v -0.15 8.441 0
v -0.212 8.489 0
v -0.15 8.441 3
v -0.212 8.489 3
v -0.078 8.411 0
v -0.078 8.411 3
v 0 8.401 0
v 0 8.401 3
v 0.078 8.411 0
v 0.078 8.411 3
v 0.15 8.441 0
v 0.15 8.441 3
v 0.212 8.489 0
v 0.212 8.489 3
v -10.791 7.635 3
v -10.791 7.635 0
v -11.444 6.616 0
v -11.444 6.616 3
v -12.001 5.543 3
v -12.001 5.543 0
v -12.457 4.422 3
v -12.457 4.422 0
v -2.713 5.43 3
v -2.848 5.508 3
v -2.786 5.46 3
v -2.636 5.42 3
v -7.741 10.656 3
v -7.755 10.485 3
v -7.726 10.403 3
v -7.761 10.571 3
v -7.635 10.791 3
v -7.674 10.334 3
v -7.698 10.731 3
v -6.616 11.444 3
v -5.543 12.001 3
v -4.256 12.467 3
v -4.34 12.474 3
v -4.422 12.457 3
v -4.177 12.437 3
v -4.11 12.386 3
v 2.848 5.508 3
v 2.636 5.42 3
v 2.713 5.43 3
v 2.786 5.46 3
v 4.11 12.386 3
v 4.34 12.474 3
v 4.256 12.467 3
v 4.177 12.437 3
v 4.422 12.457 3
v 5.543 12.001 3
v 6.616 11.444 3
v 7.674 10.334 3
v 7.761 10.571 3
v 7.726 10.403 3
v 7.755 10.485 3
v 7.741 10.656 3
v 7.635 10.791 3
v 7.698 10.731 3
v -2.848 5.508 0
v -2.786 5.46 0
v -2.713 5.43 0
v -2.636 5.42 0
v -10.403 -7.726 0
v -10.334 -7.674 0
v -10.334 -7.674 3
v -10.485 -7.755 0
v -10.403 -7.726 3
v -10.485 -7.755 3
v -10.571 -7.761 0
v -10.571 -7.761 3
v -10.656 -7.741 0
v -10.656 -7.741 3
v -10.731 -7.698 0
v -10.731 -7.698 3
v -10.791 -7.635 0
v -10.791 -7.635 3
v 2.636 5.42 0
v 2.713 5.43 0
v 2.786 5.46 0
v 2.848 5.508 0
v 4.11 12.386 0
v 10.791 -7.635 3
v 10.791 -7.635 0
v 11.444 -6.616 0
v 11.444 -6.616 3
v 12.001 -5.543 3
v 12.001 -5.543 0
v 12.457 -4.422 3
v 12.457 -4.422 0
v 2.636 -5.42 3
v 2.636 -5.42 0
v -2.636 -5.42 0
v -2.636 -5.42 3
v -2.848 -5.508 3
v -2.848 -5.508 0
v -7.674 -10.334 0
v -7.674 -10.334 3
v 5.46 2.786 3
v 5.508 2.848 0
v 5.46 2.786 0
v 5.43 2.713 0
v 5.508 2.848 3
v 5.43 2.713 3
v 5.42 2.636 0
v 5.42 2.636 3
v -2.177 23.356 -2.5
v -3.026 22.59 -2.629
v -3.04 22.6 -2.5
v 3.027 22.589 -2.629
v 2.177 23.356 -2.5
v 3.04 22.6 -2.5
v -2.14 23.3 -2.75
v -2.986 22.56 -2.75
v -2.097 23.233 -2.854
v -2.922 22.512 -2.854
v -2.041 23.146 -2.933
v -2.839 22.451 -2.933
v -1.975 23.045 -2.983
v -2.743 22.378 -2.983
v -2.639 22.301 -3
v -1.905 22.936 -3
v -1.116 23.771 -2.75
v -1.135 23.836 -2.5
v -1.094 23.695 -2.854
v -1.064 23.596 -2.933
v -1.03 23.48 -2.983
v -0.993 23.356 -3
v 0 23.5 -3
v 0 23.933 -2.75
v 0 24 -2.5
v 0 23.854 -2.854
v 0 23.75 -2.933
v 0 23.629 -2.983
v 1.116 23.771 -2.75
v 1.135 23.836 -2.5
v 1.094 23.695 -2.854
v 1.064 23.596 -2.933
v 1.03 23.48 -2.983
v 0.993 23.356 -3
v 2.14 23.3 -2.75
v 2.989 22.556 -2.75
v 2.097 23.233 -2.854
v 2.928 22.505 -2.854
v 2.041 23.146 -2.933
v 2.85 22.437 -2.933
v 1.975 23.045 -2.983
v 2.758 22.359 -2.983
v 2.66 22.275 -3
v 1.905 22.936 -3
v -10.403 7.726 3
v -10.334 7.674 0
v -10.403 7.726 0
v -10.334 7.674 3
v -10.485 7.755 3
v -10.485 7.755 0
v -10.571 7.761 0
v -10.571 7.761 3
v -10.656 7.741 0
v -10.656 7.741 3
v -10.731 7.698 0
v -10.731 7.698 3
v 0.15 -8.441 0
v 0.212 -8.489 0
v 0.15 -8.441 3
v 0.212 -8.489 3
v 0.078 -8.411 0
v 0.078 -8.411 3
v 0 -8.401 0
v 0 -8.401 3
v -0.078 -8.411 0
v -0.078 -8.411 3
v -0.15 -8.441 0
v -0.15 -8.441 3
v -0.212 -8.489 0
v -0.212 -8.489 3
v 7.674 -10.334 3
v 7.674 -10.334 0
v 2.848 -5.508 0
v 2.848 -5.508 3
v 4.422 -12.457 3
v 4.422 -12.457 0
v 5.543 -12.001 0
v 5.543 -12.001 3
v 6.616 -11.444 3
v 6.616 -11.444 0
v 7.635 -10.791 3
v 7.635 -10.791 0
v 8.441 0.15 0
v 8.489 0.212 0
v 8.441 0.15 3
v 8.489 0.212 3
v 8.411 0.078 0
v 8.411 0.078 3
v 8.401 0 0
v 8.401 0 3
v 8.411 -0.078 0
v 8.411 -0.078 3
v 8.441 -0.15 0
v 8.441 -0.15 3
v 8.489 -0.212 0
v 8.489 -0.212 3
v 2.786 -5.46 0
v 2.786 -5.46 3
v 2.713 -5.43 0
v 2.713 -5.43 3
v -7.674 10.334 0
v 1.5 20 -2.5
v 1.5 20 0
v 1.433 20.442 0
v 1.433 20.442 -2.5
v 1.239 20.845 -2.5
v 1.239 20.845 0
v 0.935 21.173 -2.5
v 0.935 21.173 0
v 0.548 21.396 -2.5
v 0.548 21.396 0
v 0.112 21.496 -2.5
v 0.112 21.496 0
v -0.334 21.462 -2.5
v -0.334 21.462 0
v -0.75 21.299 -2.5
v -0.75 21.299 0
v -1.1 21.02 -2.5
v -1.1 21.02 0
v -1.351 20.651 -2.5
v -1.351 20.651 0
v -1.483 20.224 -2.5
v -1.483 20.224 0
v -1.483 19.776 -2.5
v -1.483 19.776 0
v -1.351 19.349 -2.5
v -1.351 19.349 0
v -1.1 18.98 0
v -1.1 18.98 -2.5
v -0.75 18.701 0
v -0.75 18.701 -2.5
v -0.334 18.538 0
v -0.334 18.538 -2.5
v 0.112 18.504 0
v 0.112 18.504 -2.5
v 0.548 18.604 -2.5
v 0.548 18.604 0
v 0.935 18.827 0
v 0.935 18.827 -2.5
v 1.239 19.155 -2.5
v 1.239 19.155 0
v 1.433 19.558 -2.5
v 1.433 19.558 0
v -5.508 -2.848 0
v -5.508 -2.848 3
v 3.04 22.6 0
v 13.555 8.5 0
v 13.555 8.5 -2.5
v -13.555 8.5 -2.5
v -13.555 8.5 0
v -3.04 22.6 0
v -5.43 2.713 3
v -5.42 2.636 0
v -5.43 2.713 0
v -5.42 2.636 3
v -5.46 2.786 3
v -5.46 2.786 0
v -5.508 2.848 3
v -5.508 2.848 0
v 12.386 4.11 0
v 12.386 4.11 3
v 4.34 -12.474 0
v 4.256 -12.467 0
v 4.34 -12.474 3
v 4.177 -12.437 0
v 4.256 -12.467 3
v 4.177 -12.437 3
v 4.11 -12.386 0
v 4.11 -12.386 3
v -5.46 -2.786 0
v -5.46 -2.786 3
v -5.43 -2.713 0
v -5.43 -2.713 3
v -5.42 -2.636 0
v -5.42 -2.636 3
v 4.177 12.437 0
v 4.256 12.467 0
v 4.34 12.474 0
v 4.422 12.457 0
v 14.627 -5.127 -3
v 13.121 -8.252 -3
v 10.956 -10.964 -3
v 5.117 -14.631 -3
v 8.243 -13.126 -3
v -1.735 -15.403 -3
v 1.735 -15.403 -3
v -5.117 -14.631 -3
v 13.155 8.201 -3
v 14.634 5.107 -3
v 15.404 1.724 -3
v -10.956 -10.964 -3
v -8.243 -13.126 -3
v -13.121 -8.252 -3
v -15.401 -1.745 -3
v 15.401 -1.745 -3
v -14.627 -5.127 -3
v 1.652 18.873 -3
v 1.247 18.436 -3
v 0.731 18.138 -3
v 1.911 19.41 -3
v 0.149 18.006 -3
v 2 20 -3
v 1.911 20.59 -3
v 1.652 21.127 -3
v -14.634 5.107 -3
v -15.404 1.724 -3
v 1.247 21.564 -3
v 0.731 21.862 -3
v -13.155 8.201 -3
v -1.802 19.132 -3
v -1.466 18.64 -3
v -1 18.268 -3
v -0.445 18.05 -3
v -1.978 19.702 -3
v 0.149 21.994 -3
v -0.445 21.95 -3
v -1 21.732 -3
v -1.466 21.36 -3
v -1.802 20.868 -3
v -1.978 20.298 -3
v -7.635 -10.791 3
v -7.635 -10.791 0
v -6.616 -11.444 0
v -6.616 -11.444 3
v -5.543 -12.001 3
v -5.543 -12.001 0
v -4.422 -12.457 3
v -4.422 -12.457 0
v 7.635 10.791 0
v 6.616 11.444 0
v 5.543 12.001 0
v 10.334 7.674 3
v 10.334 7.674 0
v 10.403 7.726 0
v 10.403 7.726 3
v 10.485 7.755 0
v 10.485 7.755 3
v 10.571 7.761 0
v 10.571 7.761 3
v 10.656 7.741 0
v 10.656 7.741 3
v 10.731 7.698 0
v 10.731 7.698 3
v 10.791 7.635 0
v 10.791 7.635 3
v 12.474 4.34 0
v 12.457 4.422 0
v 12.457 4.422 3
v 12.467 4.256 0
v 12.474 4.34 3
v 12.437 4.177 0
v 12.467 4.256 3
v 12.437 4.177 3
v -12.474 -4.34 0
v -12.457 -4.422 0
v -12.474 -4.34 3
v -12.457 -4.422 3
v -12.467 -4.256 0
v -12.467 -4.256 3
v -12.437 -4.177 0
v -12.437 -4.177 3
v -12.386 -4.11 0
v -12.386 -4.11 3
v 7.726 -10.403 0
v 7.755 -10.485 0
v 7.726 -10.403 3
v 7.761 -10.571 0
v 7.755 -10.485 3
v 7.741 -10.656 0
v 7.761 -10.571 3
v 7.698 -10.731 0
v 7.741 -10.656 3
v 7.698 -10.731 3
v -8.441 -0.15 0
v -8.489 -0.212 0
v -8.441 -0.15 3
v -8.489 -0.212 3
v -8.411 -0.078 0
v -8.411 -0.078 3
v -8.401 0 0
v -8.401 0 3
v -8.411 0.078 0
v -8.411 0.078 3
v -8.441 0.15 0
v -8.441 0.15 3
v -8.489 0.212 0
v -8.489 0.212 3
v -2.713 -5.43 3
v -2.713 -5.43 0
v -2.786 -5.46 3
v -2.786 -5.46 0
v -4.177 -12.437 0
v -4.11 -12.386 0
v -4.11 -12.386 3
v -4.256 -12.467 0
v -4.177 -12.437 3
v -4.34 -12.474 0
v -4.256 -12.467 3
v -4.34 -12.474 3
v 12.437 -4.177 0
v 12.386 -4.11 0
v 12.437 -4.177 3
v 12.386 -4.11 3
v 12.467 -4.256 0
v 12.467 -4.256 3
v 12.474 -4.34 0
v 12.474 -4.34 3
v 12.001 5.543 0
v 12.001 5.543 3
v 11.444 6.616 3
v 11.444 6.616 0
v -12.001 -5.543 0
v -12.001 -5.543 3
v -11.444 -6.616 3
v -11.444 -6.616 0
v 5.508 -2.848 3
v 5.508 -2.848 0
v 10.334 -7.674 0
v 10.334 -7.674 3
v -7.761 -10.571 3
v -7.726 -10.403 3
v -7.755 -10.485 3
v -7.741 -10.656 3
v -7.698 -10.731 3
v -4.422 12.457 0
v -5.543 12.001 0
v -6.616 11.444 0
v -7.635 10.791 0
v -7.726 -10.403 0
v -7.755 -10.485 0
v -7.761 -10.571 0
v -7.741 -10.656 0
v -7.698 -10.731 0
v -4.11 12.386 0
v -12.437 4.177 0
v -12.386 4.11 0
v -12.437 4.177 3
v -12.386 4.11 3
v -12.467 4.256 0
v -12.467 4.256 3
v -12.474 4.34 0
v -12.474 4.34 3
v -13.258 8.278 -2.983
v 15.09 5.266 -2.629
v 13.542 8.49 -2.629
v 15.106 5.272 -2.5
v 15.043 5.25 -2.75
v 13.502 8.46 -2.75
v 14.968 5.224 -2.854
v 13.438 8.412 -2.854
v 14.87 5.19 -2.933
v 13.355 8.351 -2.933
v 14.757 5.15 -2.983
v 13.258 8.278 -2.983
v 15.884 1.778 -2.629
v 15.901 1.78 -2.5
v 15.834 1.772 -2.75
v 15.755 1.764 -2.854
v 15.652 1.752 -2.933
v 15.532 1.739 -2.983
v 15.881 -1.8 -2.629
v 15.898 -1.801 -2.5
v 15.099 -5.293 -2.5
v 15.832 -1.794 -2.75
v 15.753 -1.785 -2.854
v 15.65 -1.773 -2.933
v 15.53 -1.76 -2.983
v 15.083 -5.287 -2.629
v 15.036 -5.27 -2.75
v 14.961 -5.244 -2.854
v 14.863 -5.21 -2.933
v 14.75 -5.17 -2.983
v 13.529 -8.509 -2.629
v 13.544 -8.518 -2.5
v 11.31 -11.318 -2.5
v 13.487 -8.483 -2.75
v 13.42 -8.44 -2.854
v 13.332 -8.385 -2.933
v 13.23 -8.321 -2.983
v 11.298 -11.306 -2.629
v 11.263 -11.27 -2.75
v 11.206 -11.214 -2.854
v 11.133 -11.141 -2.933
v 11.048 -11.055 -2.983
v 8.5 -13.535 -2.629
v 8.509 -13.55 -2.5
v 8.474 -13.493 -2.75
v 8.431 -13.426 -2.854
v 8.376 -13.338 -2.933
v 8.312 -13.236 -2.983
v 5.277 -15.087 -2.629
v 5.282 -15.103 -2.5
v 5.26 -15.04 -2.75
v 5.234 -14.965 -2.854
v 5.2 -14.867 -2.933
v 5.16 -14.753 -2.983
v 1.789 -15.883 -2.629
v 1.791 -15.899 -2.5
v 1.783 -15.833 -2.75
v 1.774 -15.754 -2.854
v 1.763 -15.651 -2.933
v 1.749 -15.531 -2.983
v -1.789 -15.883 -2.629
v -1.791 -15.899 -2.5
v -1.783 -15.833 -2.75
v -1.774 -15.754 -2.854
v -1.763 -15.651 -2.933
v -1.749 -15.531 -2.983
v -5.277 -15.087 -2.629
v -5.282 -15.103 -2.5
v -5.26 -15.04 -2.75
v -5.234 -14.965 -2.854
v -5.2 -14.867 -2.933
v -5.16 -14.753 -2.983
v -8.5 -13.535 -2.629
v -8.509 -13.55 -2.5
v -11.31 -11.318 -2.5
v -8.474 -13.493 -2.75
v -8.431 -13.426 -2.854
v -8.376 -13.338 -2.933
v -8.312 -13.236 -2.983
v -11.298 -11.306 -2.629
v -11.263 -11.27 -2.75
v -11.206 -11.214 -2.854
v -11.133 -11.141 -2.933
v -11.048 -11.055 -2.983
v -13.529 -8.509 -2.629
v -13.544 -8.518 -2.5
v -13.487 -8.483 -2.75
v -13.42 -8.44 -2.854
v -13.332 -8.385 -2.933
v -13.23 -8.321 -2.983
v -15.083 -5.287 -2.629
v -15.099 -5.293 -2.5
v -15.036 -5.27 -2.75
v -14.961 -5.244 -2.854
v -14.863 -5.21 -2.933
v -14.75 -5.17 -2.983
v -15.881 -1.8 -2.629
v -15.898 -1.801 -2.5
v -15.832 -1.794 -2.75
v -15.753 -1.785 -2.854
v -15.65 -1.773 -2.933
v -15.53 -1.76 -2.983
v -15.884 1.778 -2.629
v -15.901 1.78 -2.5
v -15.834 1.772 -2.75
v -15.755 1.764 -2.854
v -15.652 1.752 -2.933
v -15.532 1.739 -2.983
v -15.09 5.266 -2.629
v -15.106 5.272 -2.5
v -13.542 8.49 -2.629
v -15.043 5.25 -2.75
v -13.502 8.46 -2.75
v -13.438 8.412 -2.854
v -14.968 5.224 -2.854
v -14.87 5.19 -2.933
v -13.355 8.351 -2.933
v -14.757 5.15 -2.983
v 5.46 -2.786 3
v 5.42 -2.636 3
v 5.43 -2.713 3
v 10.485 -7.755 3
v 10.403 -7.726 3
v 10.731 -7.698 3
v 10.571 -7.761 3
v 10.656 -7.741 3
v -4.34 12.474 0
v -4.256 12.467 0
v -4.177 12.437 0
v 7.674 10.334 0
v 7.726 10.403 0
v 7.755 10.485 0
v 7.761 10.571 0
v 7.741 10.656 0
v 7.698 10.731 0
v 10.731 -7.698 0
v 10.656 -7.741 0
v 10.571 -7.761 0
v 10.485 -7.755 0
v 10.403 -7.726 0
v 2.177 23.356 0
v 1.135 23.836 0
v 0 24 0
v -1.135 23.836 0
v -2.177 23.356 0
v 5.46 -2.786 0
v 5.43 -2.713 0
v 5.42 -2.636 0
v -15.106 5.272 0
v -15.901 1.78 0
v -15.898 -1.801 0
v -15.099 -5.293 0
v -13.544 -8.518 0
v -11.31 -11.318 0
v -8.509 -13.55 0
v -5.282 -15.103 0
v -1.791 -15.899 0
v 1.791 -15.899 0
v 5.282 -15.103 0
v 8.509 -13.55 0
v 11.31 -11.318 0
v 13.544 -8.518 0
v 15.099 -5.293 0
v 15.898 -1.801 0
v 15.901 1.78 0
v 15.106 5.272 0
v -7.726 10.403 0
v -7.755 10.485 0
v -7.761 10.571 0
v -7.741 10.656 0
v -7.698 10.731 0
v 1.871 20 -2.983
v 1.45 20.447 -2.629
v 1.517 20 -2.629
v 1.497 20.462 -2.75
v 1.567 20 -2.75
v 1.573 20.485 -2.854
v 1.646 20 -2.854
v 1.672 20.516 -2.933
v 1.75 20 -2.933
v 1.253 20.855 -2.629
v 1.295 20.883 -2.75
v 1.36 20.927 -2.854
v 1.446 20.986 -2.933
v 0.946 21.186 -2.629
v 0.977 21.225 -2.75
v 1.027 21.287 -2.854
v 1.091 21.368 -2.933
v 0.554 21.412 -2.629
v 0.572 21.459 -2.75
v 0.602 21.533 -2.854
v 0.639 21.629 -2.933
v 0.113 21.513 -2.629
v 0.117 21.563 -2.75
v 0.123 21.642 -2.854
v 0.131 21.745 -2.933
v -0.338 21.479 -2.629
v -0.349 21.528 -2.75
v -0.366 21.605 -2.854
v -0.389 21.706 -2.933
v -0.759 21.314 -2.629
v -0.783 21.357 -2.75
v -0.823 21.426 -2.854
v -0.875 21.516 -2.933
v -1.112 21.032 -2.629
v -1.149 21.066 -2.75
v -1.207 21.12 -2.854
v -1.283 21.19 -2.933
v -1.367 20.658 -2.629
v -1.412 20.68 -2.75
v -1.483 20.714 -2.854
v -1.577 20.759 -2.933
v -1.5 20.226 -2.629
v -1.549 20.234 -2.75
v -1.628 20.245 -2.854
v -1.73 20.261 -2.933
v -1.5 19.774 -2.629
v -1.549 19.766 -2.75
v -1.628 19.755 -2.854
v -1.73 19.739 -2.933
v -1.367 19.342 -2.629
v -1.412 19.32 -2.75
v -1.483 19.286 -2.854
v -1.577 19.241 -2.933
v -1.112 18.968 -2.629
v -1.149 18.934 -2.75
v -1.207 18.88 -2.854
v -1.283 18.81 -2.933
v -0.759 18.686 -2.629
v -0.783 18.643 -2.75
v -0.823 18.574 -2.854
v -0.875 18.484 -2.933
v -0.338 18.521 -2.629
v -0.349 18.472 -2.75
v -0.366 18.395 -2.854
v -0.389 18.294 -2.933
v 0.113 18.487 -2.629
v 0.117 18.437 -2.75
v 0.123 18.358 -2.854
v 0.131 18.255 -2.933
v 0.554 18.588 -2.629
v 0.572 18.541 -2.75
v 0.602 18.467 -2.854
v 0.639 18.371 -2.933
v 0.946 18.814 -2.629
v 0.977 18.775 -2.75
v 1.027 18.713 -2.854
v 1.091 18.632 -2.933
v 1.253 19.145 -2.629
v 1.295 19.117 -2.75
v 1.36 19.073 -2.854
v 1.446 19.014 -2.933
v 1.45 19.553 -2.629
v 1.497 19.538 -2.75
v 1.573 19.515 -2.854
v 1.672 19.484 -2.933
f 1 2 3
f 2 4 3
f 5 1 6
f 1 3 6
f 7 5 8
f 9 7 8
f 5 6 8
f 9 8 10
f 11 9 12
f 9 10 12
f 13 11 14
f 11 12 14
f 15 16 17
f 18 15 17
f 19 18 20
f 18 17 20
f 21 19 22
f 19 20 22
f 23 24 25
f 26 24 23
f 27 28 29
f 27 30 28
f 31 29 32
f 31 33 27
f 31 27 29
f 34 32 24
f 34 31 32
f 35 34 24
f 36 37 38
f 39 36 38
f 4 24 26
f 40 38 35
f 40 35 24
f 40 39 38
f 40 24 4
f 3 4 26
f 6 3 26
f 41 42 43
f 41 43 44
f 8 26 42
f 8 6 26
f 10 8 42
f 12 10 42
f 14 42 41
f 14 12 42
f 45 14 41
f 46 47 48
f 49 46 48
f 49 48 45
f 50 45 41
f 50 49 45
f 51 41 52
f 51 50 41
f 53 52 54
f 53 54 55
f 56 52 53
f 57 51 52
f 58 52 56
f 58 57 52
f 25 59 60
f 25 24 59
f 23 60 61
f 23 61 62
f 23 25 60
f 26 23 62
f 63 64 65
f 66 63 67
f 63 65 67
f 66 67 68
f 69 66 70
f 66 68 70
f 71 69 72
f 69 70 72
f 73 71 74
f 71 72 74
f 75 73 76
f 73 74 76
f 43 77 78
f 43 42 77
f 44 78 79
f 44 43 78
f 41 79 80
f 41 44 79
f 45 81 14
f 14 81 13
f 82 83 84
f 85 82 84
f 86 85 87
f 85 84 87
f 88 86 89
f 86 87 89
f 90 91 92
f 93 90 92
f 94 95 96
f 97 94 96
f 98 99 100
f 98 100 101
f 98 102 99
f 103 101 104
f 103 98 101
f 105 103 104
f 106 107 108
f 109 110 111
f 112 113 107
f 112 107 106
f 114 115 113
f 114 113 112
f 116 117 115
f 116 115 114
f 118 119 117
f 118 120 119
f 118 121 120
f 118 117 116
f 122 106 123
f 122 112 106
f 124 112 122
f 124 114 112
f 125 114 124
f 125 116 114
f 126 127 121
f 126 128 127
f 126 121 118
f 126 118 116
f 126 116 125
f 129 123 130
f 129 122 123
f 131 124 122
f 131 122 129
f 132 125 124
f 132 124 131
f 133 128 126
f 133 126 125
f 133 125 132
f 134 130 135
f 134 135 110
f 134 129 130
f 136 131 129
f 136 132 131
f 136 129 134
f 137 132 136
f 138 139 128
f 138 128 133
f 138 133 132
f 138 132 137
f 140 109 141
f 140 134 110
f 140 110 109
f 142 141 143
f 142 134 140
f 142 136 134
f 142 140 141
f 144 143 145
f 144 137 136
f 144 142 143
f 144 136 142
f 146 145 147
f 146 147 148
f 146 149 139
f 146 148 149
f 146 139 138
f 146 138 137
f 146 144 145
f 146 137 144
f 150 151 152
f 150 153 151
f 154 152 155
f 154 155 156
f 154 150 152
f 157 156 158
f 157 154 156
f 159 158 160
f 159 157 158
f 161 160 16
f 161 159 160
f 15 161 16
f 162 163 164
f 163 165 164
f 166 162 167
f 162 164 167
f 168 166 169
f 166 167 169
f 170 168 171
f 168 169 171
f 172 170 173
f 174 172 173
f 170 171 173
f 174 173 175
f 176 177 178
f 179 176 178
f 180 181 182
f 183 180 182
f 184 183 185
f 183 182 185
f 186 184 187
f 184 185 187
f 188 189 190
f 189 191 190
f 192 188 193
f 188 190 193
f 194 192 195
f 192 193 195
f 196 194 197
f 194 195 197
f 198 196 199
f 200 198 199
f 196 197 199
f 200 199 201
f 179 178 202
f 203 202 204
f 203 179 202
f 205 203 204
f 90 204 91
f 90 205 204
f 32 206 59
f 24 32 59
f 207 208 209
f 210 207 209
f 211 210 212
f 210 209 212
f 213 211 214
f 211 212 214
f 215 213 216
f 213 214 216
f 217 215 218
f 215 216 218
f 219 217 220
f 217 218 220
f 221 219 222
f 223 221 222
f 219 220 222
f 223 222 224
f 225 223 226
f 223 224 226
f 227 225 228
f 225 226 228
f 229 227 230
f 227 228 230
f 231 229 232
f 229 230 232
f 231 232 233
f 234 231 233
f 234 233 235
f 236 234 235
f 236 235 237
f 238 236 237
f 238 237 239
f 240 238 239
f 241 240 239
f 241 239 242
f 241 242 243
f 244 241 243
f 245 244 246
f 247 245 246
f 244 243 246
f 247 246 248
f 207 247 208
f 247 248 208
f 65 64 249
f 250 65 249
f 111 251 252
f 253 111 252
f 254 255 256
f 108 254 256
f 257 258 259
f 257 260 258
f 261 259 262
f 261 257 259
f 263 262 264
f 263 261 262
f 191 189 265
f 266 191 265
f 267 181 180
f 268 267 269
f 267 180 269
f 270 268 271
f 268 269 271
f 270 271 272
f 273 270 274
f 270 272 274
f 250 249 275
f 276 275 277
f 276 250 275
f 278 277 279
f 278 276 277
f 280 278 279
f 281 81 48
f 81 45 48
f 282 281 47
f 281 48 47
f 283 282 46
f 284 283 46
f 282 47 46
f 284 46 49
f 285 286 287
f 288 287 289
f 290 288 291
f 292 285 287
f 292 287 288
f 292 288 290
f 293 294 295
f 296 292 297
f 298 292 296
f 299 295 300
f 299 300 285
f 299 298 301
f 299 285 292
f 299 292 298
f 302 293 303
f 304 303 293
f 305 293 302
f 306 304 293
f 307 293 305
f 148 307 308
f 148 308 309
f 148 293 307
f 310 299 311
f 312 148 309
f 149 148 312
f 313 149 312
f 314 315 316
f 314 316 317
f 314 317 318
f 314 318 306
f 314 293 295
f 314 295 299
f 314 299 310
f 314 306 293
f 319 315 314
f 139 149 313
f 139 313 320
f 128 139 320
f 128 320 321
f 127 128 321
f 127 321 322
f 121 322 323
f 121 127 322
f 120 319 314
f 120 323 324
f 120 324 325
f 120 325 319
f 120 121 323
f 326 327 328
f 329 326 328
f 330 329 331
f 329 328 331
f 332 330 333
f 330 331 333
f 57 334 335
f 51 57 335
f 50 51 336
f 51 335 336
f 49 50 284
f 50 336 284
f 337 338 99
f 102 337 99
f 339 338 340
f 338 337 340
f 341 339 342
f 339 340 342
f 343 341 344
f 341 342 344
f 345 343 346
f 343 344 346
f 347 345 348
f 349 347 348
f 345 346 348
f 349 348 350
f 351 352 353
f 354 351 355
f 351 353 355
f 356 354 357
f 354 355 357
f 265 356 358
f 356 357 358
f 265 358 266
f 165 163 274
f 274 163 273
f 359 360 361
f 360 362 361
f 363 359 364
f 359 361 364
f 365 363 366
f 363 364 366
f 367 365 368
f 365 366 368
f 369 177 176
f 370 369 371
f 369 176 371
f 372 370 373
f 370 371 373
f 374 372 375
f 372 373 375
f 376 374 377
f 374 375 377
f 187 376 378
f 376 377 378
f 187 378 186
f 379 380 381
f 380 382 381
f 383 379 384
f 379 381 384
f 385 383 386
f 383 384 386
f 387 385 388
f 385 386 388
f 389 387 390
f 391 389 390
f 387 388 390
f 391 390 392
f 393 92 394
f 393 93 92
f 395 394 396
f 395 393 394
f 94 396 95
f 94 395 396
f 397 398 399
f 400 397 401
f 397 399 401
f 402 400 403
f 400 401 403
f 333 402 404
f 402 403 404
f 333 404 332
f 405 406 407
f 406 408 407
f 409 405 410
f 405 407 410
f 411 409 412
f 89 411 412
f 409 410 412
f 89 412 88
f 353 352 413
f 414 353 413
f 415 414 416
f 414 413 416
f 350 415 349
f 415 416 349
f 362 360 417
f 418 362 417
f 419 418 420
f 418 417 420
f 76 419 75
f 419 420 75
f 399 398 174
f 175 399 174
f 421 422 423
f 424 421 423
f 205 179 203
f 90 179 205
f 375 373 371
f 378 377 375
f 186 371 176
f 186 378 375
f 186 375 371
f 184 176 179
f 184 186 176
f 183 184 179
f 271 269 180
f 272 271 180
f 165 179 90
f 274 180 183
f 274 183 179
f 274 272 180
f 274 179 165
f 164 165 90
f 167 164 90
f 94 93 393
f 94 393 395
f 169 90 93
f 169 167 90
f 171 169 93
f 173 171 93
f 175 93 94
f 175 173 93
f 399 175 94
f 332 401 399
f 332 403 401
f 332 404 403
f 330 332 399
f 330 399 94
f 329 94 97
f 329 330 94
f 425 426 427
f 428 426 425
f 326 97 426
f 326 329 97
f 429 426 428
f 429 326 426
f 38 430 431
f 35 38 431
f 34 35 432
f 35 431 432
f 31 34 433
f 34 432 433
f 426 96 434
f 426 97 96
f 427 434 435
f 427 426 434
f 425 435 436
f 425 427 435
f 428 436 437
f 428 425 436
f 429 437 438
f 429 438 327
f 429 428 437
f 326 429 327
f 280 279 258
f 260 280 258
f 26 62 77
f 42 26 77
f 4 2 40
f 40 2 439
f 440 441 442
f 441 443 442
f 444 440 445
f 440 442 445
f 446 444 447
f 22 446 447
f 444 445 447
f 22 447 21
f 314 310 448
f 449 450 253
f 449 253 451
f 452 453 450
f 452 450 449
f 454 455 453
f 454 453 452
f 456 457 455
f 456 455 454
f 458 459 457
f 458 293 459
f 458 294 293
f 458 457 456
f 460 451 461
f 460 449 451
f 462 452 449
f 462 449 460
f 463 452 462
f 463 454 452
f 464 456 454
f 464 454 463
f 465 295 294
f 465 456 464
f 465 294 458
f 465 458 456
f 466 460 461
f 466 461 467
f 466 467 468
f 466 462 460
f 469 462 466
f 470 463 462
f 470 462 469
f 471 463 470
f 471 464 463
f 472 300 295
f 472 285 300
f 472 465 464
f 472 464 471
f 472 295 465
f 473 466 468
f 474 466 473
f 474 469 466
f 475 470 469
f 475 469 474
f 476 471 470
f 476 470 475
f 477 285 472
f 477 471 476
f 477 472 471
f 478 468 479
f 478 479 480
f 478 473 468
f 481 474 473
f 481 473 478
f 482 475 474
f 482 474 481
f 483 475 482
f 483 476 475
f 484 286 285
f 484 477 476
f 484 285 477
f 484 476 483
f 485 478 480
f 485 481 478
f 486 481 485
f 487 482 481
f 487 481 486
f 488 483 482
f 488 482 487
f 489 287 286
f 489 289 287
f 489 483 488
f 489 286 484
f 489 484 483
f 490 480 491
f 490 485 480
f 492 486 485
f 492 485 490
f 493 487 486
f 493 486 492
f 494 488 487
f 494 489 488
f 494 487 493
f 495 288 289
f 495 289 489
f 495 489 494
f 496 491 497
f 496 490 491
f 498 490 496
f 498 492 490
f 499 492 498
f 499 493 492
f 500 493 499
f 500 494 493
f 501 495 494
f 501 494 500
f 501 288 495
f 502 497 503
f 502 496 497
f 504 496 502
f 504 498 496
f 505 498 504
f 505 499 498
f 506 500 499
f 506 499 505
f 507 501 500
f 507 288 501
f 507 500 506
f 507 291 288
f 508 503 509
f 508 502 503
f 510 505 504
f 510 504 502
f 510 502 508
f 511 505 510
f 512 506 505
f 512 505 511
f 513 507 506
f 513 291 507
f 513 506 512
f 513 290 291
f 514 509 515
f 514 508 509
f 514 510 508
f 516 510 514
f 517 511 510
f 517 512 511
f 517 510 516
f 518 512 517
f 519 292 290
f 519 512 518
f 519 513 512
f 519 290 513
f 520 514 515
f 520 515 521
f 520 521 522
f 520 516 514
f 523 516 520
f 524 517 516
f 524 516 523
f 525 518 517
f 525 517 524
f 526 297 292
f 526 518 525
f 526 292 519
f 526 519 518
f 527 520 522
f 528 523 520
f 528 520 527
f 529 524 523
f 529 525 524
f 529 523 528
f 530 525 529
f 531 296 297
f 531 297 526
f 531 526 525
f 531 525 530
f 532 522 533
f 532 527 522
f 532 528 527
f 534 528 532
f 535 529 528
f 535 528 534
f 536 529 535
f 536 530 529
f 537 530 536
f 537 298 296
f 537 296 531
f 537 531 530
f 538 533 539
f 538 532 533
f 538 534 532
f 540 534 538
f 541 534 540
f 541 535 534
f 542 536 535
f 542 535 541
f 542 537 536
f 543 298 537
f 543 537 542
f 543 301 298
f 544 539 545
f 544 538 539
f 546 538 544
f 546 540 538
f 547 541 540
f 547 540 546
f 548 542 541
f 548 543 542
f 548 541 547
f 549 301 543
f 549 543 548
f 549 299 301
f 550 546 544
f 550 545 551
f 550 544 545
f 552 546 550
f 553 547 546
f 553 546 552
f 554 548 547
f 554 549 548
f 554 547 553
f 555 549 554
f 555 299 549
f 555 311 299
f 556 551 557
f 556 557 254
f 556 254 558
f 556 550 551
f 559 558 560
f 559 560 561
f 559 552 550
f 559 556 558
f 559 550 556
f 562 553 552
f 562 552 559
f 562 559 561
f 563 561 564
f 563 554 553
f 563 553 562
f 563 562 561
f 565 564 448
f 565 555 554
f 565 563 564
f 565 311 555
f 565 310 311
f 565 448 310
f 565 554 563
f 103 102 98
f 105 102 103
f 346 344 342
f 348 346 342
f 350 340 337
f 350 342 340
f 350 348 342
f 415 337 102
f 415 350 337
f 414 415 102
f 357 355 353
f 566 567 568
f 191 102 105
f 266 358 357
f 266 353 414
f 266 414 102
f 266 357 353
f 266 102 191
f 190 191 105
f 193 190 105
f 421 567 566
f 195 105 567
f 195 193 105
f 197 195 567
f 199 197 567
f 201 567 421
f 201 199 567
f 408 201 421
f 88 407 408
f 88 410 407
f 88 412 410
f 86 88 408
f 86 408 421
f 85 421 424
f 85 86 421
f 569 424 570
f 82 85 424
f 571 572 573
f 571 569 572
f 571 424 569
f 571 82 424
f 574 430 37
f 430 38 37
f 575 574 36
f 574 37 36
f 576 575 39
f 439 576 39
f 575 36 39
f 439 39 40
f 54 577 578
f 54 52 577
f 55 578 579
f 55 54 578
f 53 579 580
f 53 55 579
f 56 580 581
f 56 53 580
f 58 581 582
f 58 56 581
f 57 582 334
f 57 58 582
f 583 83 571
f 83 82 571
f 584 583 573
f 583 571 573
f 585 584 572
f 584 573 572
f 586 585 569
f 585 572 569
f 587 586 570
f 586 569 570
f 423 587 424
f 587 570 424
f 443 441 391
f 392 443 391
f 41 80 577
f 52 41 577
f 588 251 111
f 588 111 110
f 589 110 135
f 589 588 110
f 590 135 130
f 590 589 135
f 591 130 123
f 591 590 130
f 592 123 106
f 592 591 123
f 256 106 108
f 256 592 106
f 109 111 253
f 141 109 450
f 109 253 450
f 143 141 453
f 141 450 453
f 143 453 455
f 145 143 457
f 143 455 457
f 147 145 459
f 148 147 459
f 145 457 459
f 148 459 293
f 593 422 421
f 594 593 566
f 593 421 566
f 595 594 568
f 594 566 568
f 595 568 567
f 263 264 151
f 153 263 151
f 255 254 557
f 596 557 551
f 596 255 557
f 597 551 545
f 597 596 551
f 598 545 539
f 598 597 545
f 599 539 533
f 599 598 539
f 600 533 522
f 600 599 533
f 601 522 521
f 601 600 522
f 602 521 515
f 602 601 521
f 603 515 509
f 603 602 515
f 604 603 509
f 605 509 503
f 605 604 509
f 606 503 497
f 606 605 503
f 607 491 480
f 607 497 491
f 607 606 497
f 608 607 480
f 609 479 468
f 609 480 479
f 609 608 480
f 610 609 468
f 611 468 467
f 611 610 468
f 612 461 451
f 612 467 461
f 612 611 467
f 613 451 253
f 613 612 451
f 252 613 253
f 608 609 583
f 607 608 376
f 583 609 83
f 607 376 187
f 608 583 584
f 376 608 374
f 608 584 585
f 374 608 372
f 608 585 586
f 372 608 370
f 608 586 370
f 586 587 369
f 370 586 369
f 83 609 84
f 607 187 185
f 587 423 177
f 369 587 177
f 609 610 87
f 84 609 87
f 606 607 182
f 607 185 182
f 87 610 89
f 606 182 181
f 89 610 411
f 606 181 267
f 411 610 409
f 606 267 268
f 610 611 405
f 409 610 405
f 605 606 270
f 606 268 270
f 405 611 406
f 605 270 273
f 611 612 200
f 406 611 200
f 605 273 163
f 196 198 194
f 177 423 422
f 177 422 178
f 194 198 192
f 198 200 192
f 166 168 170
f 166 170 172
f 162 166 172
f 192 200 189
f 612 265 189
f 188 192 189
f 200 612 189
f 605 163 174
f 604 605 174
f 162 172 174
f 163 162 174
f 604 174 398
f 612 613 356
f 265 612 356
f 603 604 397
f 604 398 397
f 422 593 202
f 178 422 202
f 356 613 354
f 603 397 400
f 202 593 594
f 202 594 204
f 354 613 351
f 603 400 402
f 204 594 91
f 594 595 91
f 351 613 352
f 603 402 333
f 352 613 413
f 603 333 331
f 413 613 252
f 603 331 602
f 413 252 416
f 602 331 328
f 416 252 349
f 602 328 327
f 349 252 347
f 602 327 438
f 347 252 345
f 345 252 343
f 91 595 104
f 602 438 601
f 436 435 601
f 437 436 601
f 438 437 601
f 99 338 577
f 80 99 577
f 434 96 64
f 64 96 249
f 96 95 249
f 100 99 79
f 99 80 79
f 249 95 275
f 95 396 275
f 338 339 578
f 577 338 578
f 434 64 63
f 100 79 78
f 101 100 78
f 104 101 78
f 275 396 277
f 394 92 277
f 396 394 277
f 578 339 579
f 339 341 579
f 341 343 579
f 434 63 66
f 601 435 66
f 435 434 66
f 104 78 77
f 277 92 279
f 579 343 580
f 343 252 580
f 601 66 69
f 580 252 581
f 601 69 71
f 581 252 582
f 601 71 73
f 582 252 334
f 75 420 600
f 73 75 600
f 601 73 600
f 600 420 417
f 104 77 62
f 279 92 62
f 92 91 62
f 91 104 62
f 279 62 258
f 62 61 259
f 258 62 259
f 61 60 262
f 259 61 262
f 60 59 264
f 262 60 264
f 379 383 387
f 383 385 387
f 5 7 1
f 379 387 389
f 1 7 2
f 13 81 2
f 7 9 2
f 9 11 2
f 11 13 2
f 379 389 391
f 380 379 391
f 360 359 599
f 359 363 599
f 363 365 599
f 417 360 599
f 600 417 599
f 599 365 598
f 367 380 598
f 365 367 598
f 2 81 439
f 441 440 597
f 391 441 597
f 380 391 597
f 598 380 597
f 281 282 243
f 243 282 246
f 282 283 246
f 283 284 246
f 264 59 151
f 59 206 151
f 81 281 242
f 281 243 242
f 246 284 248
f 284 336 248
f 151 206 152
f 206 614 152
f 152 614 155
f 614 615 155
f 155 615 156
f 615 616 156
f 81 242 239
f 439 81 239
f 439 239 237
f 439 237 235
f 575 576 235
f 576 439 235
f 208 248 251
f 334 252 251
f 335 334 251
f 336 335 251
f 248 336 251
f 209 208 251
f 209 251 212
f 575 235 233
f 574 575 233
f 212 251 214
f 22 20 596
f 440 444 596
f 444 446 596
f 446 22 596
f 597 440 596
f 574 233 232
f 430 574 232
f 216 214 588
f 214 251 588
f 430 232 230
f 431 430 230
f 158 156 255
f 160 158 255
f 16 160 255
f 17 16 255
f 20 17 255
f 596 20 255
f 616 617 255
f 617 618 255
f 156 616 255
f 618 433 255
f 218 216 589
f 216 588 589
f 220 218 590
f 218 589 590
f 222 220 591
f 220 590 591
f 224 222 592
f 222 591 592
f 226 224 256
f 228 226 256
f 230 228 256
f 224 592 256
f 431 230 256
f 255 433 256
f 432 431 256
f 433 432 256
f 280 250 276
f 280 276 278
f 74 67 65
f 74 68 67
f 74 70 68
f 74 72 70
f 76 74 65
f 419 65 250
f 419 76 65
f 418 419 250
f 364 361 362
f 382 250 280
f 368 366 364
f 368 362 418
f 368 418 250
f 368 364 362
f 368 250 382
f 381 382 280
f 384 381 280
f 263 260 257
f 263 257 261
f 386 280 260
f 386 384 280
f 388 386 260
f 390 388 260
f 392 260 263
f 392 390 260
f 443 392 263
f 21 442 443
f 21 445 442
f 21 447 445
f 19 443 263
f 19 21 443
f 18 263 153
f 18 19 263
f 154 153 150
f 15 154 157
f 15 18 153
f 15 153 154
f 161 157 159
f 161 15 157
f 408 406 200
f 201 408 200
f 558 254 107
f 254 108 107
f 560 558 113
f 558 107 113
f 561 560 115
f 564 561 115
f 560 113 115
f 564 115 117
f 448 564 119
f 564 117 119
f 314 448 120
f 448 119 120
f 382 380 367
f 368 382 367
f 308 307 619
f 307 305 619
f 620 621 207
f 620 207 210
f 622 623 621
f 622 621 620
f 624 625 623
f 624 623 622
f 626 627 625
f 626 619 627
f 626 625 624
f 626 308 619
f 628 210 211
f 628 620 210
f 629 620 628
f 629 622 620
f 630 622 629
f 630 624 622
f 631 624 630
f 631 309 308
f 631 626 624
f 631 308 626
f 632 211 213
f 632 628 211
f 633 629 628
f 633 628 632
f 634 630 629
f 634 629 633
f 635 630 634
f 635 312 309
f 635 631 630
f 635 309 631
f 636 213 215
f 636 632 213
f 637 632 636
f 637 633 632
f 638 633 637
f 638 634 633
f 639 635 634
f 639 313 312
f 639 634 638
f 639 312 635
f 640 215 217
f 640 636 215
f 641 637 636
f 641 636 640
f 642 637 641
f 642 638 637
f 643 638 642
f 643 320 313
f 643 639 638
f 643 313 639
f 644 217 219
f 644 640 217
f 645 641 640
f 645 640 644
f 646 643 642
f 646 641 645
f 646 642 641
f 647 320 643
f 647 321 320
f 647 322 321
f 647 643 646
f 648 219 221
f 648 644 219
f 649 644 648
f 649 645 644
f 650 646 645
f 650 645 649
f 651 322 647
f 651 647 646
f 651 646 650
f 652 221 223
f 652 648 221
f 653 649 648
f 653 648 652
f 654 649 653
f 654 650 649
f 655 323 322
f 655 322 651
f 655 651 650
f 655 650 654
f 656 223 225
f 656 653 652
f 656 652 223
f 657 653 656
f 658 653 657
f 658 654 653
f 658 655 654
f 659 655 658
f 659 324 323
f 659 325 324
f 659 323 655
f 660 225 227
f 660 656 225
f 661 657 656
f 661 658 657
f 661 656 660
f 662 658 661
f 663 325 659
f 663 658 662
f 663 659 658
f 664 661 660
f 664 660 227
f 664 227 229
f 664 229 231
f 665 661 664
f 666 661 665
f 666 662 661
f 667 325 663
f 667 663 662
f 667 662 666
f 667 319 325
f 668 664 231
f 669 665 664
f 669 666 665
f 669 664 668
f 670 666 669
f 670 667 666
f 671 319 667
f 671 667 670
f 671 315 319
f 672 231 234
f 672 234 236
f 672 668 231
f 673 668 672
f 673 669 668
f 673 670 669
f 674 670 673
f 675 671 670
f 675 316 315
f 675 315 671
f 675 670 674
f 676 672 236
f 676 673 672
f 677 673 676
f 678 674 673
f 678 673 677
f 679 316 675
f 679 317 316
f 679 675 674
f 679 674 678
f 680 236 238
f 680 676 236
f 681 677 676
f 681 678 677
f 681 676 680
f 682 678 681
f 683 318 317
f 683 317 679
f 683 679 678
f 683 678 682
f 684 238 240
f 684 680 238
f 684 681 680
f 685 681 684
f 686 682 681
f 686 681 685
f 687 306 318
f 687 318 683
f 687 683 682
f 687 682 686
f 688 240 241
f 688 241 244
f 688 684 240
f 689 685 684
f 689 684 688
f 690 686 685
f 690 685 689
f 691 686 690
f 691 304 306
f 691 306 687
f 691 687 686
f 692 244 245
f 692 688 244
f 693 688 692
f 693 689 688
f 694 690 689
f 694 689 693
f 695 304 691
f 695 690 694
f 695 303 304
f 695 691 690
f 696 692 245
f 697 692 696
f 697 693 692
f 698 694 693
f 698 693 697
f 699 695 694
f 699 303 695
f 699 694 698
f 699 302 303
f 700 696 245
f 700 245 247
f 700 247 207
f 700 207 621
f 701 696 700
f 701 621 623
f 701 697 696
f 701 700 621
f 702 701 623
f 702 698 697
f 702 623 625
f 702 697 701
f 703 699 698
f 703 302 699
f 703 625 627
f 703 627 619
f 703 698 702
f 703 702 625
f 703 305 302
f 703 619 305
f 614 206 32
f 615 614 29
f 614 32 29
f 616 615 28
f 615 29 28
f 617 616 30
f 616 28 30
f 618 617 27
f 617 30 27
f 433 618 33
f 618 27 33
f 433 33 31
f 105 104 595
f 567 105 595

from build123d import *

# Parameters (mm, degrees)
SKETCH_R           = 1.5
PAD_DEPTH          = 3
PAD001_DEPTH       = 3
POLARPATTERN_COUNT = 4
FILLET_R           = 0.3
FILLET001_R        = 0.5
FILLET002_R        = 0.3
FILLET003_R        = 0.3
FILLET004_R        = 0.3


with BuildPart() as part:
    # Sketch → Pad (new body)
    with BuildSketch(Plane.XY):
        with BuildLine():
            Line((-13.555442, 8.5), (-3.039737, 22.6))
            ThreePointArc((3.039737, 22.6), (0, 24), (-3.039737, 22.6))
            Line((3.039737, 22.6), (13.555442, 8.5))
            ThreePointArc((-13.555442, 8.5), (0, -16), (13.555442, 8.5))
        make_face()
        with Locations((0, 20)):
            Circle(SKETCH_R, mode=Mode.SUBTRACT)
    extrude(amount=-PAD_DEPTH)

    # Sketch001 (on Face6 of Pad) → Pad001 (join)
    with BuildSketch(Plane.XY):
        with BuildLine():
            Line((-2.76, 5.42), (2.76, 5.42))
            Line((2.76, 5.42), (7.92188, 10.58188))
            ThreePointArc((7.92188, 10.58188), (6.158918, 11.696157), (4.242641, 12.519279))
            Line((4.242641, 12.519279), (0, 8.276638))
            Line((0, 8.276638), (-4.242641, 12.519279))
            ThreePointArc((-4.242641, 12.519279), (-6.158918, 11.696157), (-7.92188, 10.58188))
            Line((-7.92188, 10.58188), (-2.76, 5.42))
        make_face()
    pad001 = extrude(amount=PAD001_DEPTH)

    # PolarPattern: Pad001 ×4 about axis
    polarpattern_axis = Axis((0, 0, 0), (0, 0, 1))
    for i in range(1, POLARPATTERN_COUNT):
        add(pad001.rotate(polarpattern_axis, i * 360 / POLARPATTERN_COUNT))

    # Fillet
    fillet_edges = [part.edges().sort_by_distance(p)[0] for p in [
        (-4.242641, 12.519279, 1.5),
        (0, 8.276638, 1.5),
        (4.242641, 12.519279, 1.5),
        (7.92188, 10.58188, 1.5),
        (2.76, 5.42, 1.5),
        (-2.76, 5.42, 1.5),
        (-7.92188, 10.58188, 1.5),
    ]]
    fillet(fillet_edges, radius=FILLET_R)

    # Fillet001
    fillet001_edges = [part.edges().sort_by_distance(p)[0] for p in [
        (-8.297589, 15.55, -3),
        (0, -16, -3),
        (8.297589, 15.55, -3),
        (0, 24, -3),
        (-1.5, 20, -3),
    ]]
    fillet(fillet001_edges, radius=FILLET001_R)

    # Fillet002
    fillet002_edges = [part.edges().sort_by_distance(p)[0] for p in [
        (-10.58188, 7.92188, 1.5),
        (-5.42, 2.76, 1.5),
        (-5.42, -2.76, 1.5),
        (-10.58188, -7.92188, 1.5),
        (-12.519279, -4.242641, 1.5),
        (-12.519279, 4.242641, 1.5),
        (-8.276638, 0, 1.5),
    ]]
    fillet(fillet002_edges, radius=FILLET002_R)

    # Fillet003
    fillet003_edges = [part.edges().sort_by_distance(p)[0] for p in [
        (-7.92188, -10.58188, 1.5),
        (-4.242641, -12.519279, 1.5),
        (4.242641, -12.519279, 1.5),
        (7.92188, -10.58188, 1.5),
        (0, -8.276638, 1.5),
        (-2.76, -5.42, 1.5),
        (2.76, -5.42, 1.5),
    ]]
    fillet(fillet003_edges, radius=FILLET003_R)

    # Fillet004
    fillet004_edges = [part.edges().sort_by_distance(p)[0] for p in [
        (10.58188, -7.92188, 1.5),
        (12.519279, -4.242641, 1.5),
        (12.519279, 4.242641, 1.5),
        (10.58188, 7.92188, 1.5),
        (8.276638, 0, 1.5),
        (5.42, -2.76, 1.5),
        (5.42, 2.76, 1.5),
    ]]
    fillet(fillet004_edges, radius=FILLET004_R)


solid = part.part
